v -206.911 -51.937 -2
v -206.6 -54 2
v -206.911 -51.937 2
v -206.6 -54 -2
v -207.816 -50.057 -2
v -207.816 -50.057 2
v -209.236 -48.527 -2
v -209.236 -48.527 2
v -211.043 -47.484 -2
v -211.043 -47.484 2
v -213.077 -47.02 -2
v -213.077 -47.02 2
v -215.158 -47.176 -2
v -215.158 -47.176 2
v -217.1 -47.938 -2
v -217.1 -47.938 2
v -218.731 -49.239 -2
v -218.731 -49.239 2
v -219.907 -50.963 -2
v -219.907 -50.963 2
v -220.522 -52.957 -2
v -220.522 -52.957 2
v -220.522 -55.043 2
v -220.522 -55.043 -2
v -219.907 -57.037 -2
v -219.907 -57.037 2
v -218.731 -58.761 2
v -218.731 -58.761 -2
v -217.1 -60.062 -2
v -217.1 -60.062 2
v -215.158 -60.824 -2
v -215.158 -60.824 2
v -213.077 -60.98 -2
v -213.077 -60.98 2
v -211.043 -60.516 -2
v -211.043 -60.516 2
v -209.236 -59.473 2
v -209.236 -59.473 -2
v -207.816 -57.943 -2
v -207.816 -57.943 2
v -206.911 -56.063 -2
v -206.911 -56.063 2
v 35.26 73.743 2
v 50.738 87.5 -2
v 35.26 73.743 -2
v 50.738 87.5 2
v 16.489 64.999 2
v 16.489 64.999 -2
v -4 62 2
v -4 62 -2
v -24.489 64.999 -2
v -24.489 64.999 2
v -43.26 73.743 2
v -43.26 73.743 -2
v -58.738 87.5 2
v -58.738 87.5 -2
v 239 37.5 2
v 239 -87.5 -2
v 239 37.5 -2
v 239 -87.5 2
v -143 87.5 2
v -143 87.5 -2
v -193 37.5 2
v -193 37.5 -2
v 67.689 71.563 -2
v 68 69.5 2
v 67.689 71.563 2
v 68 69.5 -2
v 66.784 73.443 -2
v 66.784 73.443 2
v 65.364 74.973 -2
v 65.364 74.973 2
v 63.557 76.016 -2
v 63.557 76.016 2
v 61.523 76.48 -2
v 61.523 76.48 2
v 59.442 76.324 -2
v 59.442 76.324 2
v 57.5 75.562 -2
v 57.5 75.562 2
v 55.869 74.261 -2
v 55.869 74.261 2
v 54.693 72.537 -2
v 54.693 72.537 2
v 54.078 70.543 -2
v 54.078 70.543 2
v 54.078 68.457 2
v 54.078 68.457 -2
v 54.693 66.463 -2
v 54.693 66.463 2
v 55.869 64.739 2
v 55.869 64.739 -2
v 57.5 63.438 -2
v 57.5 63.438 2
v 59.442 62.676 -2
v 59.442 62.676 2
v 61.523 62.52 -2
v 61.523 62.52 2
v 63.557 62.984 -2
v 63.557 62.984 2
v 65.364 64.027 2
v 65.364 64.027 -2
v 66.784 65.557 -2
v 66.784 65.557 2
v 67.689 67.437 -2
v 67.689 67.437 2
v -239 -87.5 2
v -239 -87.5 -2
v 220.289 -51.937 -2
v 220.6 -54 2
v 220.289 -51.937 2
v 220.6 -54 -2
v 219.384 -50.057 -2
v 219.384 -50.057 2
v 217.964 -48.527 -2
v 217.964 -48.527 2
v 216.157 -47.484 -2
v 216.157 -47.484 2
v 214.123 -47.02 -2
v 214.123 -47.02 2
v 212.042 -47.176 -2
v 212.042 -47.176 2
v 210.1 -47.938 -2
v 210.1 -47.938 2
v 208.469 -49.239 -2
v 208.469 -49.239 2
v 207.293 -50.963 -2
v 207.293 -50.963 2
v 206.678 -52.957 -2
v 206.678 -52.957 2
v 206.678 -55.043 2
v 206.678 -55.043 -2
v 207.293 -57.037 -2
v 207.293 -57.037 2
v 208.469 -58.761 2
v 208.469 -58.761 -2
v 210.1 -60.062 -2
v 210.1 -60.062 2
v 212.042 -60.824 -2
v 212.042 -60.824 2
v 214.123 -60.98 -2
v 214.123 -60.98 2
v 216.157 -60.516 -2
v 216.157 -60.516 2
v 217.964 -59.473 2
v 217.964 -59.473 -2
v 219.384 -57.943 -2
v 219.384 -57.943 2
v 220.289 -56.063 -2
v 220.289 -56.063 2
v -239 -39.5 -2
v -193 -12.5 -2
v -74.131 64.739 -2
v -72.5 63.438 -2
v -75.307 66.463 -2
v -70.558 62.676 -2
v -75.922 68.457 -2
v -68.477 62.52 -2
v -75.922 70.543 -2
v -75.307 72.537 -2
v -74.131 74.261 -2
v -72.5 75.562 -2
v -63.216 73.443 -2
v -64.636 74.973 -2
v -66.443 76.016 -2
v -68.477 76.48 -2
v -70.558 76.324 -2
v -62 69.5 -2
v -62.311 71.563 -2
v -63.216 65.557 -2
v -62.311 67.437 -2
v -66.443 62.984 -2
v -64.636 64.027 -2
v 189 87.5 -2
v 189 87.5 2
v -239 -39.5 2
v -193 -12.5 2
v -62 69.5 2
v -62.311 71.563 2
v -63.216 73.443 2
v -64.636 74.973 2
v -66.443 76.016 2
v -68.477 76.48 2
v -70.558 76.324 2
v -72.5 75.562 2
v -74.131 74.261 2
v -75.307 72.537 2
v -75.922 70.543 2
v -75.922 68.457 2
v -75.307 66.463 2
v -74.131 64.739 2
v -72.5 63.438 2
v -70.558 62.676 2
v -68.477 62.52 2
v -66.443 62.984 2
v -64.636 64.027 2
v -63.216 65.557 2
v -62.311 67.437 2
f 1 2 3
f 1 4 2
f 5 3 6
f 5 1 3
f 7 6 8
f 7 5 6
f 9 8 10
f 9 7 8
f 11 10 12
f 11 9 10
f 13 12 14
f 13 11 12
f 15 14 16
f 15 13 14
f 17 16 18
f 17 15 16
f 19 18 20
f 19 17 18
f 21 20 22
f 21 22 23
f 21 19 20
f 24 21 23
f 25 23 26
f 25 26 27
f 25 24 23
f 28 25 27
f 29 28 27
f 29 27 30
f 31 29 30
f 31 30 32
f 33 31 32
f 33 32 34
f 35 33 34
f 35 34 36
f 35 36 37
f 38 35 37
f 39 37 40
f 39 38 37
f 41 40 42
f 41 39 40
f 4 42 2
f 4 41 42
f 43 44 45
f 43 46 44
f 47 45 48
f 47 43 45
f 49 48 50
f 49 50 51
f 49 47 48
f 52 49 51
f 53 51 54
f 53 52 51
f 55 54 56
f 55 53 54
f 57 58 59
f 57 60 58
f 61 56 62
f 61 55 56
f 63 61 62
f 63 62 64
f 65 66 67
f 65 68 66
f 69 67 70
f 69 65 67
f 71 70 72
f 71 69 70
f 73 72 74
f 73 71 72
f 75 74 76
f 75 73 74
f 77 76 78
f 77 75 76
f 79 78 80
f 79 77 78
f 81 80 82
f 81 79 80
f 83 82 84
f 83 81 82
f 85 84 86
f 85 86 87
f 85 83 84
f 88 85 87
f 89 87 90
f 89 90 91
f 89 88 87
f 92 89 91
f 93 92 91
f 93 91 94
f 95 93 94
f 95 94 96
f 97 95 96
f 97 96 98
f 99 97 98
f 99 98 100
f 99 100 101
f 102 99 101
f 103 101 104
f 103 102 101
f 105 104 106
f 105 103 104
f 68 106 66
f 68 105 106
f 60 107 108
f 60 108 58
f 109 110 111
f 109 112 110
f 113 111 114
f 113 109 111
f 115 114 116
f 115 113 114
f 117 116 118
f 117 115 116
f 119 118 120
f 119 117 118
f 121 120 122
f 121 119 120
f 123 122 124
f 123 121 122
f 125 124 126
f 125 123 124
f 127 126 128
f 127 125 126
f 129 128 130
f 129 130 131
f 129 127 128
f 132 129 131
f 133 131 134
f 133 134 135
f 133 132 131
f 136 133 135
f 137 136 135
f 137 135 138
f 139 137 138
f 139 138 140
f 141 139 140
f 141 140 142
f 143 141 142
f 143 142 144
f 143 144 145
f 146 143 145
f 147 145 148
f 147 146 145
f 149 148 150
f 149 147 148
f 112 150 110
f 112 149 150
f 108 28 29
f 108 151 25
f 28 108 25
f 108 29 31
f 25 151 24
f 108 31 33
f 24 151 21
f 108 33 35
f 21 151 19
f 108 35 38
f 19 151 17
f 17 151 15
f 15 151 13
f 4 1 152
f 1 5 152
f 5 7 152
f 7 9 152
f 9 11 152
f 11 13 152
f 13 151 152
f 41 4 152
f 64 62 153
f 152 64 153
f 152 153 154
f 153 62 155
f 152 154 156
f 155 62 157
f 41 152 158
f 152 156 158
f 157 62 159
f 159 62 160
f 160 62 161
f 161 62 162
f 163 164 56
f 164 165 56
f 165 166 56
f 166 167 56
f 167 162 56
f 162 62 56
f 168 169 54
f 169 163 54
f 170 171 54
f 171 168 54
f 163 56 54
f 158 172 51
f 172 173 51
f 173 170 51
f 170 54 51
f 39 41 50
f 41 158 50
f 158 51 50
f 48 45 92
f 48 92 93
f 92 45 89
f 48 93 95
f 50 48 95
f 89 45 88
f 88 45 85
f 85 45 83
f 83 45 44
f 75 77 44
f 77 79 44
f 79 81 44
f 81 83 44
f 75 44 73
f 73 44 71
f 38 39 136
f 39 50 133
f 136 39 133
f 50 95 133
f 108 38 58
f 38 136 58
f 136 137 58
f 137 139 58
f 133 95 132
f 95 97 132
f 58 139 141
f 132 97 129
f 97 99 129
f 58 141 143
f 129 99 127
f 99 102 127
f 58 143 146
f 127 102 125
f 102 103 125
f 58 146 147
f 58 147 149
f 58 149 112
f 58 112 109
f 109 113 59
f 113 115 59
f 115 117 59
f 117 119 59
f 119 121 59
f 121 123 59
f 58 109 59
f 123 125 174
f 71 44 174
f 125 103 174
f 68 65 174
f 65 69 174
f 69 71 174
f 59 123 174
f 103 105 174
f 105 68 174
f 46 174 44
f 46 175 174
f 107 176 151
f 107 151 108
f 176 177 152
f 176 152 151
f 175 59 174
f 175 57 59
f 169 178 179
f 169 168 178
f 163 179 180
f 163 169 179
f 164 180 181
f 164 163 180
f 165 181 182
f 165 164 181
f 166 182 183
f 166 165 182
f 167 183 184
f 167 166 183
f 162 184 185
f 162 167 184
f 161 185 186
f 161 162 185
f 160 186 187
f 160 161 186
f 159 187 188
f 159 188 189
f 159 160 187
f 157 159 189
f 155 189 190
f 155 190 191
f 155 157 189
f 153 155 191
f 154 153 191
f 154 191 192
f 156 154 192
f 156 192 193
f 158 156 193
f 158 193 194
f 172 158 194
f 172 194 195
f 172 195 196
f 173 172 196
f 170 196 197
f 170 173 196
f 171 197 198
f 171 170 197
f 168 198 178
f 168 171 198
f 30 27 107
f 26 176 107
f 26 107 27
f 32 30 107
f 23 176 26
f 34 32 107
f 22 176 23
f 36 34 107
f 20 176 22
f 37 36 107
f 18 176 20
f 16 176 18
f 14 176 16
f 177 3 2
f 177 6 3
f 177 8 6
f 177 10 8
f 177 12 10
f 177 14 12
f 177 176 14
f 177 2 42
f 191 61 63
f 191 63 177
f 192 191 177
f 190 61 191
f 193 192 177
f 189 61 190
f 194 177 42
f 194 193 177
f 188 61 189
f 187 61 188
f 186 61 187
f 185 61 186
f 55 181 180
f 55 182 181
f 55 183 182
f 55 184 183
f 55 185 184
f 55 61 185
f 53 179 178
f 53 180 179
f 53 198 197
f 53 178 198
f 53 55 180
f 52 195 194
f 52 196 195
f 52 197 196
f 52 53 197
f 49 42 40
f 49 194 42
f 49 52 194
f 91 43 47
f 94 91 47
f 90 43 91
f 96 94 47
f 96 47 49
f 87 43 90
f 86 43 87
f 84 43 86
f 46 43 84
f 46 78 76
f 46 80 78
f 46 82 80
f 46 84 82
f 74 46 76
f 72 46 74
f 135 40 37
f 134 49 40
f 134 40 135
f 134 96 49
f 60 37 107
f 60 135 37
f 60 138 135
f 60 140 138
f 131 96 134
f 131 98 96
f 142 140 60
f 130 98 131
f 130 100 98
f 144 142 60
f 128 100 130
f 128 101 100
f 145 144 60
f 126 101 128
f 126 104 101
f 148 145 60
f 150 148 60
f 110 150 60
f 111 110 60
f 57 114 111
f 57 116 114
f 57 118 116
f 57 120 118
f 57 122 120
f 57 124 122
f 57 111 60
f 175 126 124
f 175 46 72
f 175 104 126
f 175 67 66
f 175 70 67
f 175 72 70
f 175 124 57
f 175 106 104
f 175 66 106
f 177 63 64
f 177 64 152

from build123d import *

# Parameters (mm, degrees)
F0_R     = 7
F1_DEPTH = 2


with BuildPart() as f1:
    # F0 (on Top) → F1 (new body, symmetric)
    with BuildSketch(Plane.XY):
        with BuildLine():
            Line((-58.738012, 87.5), (-143, 87.5))
            Line((-143, 87.5), (-193, 37.5))
            Line((-193, 37.5), (-193, -12.5))
            Line((-193, -12.5), (-239, -39.5))
            Line((-239, -39.5), (-239, -87.5))
            Line((-239, -87.5), (239, -87.5))
            Line((239, -87.5), (239, 37.5))
            Line((239, 37.5), (189, 87.5))
            Line((189, 87.5), (50.738012, 87.5))
            ThreePointArc((50.738012, 87.5), (-4, 62), (-58.738012, 87.5))
        make_face()
        with Locations((-213.6, -54)):
            Circle(F0_R, mode=Mode.SUBTRACT)
        with Locations((213.6, -54)):
            Circle(F0_R, mode=Mode.SUBTRACT)
        with Locations((-69, 69.5)):
            Circle(F0_R, mode=Mode.SUBTRACT)
        with Locations((61, 69.5)):
            Circle(F0_R, mode=Mode.SUBTRACT)
    extrude(amount=F1_DEPTH, both=True)


solid = f1.part
